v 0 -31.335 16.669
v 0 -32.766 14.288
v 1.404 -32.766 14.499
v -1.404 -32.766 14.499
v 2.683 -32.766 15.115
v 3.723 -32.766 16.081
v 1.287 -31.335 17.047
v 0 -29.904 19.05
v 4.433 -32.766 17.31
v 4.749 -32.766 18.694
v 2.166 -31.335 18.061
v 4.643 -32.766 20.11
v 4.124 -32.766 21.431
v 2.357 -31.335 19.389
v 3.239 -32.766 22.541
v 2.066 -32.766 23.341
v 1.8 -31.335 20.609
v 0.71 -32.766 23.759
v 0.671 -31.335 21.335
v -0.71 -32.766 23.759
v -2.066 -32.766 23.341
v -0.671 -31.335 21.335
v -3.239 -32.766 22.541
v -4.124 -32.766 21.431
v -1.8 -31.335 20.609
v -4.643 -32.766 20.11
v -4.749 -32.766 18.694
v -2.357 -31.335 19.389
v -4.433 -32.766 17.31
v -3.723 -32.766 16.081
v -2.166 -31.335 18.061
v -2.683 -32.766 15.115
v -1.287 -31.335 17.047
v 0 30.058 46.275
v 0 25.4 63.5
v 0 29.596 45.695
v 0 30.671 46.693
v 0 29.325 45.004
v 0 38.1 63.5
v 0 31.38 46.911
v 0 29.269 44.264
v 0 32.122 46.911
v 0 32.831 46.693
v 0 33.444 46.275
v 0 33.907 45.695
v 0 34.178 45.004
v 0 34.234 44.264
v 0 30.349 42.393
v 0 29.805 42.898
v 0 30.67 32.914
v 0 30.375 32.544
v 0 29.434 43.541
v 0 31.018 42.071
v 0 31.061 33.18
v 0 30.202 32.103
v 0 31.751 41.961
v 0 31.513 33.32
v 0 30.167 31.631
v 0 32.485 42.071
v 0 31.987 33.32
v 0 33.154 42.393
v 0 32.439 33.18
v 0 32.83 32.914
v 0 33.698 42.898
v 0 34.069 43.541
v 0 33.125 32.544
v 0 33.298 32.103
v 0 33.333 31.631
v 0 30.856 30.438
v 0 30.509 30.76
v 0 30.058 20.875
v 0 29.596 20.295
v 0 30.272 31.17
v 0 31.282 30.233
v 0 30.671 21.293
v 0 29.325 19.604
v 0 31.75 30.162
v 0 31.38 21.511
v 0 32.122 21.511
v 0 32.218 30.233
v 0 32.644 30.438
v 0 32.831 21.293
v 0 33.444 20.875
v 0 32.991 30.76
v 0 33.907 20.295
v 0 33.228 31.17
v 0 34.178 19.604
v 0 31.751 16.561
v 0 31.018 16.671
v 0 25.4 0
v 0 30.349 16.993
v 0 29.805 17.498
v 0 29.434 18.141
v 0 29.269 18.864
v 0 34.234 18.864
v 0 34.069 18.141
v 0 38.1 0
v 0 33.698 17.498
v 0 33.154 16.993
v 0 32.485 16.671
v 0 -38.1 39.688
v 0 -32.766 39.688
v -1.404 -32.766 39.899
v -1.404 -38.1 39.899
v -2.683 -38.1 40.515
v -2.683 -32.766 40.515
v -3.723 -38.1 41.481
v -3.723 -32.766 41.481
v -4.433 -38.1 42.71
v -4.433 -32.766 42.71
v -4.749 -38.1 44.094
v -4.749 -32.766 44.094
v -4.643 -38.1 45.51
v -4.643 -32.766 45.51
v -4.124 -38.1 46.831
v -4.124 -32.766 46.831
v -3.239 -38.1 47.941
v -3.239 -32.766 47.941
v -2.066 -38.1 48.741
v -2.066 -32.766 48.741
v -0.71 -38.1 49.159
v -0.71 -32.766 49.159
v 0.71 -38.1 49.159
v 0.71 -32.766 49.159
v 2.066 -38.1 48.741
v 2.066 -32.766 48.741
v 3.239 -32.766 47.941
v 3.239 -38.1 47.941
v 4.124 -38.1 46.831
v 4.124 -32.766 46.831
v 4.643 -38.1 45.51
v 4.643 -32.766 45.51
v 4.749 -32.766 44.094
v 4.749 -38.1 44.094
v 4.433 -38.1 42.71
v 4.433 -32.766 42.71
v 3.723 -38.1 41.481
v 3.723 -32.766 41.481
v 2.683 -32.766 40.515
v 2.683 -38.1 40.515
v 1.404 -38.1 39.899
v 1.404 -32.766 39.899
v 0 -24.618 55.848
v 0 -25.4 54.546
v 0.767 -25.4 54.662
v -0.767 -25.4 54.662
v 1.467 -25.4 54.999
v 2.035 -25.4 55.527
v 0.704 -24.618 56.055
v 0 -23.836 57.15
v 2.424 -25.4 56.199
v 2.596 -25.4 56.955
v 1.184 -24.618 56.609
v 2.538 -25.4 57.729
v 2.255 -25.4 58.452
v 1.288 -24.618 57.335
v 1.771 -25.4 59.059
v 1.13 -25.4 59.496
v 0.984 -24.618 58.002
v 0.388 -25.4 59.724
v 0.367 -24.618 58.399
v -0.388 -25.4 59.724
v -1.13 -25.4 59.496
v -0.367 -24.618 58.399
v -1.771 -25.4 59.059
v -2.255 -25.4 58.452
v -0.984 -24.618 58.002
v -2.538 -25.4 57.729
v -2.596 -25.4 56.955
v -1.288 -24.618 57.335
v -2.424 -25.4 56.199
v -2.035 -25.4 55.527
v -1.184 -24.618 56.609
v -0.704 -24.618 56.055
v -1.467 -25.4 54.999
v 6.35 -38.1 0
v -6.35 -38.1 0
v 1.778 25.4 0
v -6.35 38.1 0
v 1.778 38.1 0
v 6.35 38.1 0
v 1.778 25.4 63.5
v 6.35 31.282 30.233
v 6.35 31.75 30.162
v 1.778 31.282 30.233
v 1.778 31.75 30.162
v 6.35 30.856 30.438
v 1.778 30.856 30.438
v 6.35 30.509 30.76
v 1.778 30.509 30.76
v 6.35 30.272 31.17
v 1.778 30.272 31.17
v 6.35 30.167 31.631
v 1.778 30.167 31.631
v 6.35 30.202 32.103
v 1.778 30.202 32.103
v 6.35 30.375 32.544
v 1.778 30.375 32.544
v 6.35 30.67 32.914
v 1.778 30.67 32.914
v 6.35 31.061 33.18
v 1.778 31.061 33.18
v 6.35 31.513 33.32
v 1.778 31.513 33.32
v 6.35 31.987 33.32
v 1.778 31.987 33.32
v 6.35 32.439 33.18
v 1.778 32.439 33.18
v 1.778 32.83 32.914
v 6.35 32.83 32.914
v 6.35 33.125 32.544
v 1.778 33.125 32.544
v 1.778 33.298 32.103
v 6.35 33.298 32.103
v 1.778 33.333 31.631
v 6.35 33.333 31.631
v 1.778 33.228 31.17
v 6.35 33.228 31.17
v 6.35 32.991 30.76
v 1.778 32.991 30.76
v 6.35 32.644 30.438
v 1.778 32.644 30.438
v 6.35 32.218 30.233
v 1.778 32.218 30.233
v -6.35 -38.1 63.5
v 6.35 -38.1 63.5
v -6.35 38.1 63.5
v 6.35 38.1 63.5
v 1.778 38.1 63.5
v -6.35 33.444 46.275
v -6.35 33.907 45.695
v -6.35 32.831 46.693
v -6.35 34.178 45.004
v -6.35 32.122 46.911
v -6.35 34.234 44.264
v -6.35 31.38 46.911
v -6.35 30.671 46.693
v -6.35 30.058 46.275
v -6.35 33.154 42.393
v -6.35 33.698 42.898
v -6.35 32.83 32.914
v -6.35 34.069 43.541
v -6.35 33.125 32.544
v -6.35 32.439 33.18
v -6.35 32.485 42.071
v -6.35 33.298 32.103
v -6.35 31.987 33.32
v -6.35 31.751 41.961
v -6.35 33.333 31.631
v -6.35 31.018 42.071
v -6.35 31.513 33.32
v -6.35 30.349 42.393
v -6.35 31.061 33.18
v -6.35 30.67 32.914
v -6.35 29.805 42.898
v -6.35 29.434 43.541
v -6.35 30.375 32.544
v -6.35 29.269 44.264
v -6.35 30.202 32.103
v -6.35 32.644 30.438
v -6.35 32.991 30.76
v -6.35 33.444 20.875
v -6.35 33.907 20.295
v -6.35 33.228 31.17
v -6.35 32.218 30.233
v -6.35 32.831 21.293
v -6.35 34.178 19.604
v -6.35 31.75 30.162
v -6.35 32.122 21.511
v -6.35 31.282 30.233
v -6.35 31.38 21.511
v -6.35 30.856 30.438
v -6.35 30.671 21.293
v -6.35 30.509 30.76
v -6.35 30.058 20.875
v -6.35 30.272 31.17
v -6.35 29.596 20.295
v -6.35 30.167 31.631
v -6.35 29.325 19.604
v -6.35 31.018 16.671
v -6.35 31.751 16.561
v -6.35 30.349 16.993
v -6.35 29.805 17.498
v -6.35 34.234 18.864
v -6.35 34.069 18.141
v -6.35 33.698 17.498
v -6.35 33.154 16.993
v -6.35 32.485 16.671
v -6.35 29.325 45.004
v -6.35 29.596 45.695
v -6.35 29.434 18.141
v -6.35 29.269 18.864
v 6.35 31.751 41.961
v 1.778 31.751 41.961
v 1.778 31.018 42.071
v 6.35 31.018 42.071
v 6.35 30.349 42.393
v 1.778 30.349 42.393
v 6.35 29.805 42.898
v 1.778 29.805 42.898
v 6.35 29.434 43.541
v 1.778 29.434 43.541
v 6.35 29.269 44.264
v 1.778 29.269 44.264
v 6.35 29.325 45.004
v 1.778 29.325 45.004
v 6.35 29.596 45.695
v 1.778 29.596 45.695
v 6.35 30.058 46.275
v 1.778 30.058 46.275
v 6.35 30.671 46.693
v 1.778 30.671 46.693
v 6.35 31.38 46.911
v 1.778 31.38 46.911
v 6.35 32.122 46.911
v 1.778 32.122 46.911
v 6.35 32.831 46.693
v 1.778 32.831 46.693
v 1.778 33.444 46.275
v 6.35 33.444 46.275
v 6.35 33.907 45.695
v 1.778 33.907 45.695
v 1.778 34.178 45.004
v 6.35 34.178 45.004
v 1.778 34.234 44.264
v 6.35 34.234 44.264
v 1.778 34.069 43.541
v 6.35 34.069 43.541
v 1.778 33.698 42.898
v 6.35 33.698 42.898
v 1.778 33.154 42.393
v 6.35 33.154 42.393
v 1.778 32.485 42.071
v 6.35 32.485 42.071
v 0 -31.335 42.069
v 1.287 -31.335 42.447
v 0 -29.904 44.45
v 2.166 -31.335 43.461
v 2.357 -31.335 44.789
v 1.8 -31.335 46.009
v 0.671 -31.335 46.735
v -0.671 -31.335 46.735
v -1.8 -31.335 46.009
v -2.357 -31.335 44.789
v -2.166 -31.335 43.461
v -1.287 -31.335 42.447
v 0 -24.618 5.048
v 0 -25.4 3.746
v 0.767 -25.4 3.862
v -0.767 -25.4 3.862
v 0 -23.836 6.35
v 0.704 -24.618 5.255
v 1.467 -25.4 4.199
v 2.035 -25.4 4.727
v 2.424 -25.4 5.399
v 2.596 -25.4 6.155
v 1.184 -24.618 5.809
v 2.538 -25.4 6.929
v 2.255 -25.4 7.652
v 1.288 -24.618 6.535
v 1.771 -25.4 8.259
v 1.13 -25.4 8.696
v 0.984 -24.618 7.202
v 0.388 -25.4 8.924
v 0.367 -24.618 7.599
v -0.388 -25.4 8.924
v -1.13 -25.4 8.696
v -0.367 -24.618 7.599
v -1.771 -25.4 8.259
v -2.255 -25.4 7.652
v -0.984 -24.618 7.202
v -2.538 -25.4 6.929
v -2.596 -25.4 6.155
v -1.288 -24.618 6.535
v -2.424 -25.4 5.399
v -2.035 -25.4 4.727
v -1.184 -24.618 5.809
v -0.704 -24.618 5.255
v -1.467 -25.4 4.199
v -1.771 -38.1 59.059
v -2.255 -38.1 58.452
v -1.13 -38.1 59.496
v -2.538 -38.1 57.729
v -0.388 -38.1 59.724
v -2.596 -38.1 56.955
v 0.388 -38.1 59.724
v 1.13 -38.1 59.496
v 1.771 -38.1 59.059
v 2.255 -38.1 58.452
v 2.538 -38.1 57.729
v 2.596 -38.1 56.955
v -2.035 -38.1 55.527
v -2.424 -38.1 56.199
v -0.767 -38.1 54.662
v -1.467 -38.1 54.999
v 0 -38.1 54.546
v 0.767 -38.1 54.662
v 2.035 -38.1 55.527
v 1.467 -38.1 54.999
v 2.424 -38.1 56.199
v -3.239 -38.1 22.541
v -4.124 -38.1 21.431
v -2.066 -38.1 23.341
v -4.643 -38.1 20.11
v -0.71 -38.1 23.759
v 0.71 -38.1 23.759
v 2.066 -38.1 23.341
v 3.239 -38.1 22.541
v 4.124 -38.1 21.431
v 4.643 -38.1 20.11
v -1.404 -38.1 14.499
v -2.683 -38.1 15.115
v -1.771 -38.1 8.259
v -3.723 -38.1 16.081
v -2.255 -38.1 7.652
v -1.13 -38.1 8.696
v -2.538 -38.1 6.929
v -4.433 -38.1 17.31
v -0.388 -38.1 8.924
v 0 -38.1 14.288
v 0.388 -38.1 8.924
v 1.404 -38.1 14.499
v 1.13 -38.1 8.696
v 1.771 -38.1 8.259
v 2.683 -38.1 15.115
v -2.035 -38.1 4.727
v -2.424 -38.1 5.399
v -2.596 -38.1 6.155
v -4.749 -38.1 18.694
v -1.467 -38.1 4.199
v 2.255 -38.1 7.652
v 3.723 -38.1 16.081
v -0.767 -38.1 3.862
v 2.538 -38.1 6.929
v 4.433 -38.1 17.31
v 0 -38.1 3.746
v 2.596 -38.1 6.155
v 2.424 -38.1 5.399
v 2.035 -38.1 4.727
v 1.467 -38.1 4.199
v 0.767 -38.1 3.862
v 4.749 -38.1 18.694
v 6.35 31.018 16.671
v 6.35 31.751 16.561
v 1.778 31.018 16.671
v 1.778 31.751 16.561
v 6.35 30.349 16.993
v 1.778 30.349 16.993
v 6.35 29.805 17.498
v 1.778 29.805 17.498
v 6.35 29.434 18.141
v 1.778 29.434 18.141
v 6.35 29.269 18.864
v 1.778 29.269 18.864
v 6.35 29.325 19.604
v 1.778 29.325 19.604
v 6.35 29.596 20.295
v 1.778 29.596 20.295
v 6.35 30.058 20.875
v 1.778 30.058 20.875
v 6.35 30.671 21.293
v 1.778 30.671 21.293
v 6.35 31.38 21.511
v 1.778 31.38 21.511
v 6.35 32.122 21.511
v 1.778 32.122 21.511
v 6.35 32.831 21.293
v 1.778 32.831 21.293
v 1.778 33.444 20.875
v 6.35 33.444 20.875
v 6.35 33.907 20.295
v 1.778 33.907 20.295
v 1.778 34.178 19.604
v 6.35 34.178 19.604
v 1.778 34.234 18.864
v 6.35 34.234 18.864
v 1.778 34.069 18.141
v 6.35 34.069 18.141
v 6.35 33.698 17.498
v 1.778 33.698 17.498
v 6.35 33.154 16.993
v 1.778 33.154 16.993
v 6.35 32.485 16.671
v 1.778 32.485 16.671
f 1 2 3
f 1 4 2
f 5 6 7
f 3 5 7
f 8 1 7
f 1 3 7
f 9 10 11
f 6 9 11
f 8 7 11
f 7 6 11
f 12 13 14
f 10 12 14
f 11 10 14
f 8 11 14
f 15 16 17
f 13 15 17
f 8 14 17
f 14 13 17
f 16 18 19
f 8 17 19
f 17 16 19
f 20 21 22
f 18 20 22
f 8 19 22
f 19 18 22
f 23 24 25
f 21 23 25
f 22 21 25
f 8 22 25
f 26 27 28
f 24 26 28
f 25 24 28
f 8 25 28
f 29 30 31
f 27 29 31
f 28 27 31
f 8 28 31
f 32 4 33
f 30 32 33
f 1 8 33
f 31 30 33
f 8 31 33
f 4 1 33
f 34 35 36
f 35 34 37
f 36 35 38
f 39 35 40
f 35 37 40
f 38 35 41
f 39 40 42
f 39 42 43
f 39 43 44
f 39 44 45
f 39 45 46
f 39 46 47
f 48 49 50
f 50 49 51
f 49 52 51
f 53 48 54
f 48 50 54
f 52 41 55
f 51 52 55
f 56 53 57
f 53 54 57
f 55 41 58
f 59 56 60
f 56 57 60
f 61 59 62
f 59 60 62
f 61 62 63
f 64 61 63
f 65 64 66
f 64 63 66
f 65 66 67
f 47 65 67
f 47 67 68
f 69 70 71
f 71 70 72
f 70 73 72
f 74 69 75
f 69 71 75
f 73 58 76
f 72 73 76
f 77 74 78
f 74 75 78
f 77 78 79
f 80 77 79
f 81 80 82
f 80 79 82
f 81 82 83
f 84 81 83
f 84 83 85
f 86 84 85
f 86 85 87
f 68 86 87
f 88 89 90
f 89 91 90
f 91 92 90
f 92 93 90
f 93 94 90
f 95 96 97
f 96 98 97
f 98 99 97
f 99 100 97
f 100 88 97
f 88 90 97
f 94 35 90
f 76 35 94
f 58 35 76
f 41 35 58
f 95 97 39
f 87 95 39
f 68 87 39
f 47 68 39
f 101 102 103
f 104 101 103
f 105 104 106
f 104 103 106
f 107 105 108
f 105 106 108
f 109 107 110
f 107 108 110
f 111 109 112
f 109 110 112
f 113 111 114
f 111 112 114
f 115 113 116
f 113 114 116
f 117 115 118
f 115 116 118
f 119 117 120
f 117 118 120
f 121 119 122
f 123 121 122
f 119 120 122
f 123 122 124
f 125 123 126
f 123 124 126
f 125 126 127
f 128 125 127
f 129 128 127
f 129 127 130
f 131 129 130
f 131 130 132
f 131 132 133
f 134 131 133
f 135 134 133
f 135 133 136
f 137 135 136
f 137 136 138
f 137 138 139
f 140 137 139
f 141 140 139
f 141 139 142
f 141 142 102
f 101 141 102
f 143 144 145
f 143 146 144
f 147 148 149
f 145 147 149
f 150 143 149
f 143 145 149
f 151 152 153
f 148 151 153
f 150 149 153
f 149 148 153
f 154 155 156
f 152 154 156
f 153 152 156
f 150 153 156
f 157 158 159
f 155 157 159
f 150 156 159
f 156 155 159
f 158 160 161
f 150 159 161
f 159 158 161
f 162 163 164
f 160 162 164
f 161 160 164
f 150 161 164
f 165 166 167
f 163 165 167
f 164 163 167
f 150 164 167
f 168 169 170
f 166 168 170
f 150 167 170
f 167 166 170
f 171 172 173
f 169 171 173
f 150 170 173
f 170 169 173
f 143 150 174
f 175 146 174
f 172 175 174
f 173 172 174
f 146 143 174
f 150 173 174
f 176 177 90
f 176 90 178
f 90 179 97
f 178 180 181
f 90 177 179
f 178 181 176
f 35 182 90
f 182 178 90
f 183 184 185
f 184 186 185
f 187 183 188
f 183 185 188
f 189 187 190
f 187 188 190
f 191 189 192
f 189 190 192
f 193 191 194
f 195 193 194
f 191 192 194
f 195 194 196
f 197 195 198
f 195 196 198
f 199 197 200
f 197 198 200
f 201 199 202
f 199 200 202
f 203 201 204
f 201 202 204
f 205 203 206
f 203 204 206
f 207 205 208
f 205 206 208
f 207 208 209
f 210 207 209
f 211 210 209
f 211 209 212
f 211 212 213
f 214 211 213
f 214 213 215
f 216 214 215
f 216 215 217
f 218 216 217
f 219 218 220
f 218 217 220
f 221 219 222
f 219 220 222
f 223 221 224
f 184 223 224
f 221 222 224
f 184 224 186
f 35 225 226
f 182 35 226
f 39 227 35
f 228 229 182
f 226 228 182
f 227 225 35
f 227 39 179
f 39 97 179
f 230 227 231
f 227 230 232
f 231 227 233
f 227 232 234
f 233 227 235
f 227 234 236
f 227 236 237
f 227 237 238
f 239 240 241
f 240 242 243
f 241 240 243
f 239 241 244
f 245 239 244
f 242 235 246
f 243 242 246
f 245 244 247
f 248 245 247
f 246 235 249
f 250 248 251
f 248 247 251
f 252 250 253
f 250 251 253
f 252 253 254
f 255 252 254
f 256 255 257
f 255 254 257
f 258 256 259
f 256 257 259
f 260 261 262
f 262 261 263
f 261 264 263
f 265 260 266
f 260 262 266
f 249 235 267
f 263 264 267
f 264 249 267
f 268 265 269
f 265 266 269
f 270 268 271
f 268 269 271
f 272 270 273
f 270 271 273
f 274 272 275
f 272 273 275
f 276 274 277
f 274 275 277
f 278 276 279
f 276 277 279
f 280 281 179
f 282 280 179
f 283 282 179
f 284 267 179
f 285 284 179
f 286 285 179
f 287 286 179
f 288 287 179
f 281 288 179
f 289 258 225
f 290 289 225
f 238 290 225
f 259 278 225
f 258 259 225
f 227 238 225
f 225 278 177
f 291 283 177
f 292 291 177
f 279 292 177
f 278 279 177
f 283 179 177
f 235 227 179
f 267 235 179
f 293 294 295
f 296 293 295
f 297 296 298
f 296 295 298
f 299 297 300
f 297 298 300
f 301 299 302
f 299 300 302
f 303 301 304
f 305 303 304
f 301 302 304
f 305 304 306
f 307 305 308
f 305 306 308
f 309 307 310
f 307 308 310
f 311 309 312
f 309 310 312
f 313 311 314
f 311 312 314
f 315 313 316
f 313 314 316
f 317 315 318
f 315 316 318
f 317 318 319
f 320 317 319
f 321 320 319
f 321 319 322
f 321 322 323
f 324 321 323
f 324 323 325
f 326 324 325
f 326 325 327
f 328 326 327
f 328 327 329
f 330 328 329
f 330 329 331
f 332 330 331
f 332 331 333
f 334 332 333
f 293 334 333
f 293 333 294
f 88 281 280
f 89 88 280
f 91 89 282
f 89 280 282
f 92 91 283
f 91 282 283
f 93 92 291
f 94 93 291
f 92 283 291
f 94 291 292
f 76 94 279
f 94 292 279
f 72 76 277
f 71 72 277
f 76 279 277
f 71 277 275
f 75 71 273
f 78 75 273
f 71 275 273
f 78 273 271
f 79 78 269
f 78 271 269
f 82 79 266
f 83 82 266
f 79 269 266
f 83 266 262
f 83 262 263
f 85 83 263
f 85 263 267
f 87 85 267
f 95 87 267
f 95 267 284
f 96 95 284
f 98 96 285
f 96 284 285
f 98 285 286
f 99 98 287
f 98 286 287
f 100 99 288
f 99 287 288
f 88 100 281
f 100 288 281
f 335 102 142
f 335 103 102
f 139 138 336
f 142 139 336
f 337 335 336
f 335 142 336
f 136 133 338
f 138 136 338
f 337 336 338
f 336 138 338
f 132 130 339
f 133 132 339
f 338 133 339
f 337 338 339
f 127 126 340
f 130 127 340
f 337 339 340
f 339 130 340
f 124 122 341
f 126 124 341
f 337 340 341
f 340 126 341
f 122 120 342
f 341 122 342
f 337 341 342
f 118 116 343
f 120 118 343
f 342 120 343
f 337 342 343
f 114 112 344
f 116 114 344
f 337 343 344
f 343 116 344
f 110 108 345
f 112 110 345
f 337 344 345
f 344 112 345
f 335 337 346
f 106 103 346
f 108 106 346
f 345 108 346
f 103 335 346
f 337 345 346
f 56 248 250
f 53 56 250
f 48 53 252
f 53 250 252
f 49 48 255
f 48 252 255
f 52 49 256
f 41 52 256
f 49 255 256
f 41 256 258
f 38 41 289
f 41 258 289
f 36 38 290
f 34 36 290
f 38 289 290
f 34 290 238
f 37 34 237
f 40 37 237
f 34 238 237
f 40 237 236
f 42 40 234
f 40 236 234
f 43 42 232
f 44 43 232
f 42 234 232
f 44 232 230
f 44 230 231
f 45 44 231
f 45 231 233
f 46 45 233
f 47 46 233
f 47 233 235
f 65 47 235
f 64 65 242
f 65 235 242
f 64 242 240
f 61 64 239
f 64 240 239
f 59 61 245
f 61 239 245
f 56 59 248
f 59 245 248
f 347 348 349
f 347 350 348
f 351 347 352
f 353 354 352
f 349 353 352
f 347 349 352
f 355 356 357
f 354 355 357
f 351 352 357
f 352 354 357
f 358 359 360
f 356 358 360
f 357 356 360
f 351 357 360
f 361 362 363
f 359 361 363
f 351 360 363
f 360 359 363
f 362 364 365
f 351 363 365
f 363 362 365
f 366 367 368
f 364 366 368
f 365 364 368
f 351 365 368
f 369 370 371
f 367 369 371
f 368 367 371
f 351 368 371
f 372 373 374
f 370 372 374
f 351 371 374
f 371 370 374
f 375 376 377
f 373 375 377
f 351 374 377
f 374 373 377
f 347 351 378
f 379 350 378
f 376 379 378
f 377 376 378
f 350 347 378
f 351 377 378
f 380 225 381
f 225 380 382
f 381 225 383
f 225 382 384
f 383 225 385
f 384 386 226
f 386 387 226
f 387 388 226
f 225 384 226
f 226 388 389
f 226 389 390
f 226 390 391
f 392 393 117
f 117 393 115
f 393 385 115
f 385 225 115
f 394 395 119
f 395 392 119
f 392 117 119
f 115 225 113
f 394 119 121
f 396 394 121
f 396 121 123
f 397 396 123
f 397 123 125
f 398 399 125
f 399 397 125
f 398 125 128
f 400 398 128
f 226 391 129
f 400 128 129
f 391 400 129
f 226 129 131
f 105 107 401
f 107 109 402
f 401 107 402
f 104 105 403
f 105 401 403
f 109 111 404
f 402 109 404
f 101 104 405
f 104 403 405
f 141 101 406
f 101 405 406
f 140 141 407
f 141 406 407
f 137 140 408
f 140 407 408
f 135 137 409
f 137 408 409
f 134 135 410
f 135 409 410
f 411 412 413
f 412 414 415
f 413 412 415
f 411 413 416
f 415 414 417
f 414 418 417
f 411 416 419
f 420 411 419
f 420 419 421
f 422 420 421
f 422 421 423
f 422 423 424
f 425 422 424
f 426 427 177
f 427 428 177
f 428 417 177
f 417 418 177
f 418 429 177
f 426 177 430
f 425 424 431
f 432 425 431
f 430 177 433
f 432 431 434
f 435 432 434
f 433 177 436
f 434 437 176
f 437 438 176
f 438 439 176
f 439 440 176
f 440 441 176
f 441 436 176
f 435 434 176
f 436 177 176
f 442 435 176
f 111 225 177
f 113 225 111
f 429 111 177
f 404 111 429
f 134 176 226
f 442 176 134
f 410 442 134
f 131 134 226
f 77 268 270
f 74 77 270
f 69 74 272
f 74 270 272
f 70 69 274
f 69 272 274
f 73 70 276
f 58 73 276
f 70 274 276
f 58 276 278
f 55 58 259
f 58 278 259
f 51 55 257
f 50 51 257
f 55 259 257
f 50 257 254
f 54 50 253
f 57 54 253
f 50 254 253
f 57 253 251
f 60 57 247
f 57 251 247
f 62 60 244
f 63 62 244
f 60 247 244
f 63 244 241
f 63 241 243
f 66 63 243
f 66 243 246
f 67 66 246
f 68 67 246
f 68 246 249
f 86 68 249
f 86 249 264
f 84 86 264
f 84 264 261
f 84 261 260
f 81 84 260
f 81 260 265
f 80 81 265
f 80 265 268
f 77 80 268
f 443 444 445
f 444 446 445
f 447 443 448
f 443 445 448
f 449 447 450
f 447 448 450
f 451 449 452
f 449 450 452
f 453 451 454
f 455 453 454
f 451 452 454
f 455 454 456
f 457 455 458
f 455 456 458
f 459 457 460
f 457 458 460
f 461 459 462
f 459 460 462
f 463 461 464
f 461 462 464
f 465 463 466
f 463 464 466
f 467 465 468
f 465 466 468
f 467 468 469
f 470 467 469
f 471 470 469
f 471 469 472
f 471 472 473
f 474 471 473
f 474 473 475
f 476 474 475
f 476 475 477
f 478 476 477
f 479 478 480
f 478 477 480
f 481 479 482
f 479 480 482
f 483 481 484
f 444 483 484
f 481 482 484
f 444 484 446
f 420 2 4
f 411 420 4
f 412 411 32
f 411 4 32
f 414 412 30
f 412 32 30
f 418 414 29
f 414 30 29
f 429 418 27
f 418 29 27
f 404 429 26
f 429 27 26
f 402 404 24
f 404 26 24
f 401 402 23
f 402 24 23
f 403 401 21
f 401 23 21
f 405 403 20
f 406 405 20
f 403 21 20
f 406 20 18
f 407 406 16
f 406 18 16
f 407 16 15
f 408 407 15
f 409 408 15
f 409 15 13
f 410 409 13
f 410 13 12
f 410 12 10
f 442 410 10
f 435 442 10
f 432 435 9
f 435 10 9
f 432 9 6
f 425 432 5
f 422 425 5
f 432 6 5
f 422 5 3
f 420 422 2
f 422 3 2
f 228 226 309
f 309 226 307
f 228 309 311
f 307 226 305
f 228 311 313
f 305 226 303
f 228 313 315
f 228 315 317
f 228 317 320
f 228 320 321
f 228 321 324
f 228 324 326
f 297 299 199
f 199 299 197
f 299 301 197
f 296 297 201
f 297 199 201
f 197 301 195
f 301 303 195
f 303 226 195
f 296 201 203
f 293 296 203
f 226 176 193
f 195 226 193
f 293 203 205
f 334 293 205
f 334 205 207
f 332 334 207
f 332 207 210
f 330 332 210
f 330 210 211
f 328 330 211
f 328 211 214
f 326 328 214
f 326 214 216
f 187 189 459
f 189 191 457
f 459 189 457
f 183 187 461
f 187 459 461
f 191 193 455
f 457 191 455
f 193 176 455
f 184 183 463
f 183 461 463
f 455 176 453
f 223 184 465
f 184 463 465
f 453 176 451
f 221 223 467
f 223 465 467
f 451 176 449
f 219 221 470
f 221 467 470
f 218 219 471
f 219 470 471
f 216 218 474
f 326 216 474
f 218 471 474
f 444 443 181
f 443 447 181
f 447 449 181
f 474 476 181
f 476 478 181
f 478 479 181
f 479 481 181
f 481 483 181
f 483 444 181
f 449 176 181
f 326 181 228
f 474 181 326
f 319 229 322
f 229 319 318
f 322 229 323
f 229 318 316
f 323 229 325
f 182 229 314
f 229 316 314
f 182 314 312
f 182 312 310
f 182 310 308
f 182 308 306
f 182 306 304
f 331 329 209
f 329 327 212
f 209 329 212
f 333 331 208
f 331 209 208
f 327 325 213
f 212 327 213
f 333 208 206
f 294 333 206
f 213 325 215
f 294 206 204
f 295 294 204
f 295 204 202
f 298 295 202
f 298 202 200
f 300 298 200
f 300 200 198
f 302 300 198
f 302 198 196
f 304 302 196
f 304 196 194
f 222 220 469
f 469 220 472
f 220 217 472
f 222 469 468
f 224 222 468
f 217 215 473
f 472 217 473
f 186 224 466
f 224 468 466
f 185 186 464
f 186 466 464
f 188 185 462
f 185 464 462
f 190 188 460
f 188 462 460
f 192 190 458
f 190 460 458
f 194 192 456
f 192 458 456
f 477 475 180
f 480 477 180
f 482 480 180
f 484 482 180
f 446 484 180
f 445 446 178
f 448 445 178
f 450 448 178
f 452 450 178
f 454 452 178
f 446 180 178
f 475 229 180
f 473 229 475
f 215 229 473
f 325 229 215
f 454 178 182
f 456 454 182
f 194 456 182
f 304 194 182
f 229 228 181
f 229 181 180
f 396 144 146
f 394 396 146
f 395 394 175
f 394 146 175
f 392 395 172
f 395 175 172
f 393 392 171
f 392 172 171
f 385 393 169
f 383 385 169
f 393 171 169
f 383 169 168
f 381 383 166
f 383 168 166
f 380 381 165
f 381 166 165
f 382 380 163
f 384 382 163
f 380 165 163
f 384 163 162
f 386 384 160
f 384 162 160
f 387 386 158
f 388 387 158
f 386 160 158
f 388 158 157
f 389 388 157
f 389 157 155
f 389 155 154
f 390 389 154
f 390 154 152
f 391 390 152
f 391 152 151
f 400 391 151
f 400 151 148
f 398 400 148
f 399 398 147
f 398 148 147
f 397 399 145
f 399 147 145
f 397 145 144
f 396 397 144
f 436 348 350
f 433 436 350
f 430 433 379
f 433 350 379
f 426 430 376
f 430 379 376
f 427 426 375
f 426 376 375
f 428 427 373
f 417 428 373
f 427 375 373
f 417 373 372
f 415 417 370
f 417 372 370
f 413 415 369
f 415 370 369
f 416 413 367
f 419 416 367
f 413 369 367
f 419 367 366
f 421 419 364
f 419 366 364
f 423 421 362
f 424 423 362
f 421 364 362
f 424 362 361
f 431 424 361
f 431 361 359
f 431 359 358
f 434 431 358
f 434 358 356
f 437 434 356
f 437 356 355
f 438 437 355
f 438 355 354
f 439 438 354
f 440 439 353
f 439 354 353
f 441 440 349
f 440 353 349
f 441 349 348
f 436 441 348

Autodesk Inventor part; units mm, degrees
ref_plane "YZ Plane" through (0, 0, 0) normal (1, 0, 0) x (0, 1, 0)
ref_plane "XZ Plane" through (0, 0, 0) normal (0, 1, 0) x (-1, 0, 0)
ref_plane "XY Plane" through (0, 0, 0) normal (0, 0, 1) x (1, 0, 0)
sketch "Sketch1" plane through (0, 0, 0) normal (0, 0, 1) x (1, 0, 0)
  line L0 (-6.35, -38.1) -> (6.35, -38.1)
  line L1 (6.35, -38.1) -> (6.35, 38.1)
  line L2 (6.35, 38.1) -> (-6.35, 38.1)
  line L3 (-6.35, 38.1) -> (-6.35, -38.1)
  line L4 (-6.35, -38.1) -> (6.35, 38.1) construction
  line L5 (6.35, -38.1) -> (-6.35, 38.1) construction
  line L6 (-0.889, 50.8) -> (0.889, 50.8)
  line L7 (0.889, 50.8) -> (0.889, 25.4)
  line L8 (0.889, 25.4) -> (-0.889, 25.4)
  line L9 (-0.889, 25.4) -> (-0.889, 50.8)
  line L10 (-0.889, 50.8) -> (0.889, 25.4) construction
  line L11 (0.889, 50.8) -> (-0.889, 25.4) construction
  point P0 (0, 0)
  point P1 (0, 38.1)
  dimension "d0" = 12.7
  dimension "d1" = 76.2
  dimension "d2" = 1.778
  dimension "d3" = 12.7
extrude "Extrusion1" add sketch "Sketch1" along normal blind 63.5 contours L3 L2 L9 L8 L7 L1 L0 | L2 L7 L8 L9
sketch "Sketch2" plane through (0, 0, 0) normal (0, 0, -1) x (-1, 0, 0)
  line L0 (-6.35, 38.1) -> (6.35, 38.1) projected
  line L1 (0, 38.1) -> (-1.778, 38.1)
  line L2 (-1.778, 38.1) -> (-1.778, 25.4)
  line L3 (-1.778, 25.4) -> (0, 25.4)
  line L4 (0, 25.4) -> (0, 38.1)
  point P0 (0, 0)
  dimension "d6" = 1.778
  dimension "d7" = 12.7
extrude "Extrusion2" cut sketch "Sketch2" against normal blind 63.5
sketch "Sketch3" plane through (6.35, -38.1, 0) normal (1, 0, 0) x (0, 0, -1)
  line L0 (0, 76.2) -> (-63.5, 76.2) projected
  line L1 (-63.5, 0) -> (-63.5, 76.2) projected
  point P0 (0, 38.1)
  point P1 (-31.75, 69.85)
  dimension "d10" = 6.35
  dimension "d11" = 31.75
hole "Hole1" at (6.35, 31.75, 31.75) direction (-1, 0, 0) diameter 3.175 end through all
sketch "Sketch4" plane through (6.35, -38.1, 0) normal (1, 0, 0) x (0, 0, -1)
  line L0 (-44.45, 69.8514) -> (-19.05, 69.8514)
  line L1 (0, 0) -> (0, 76.2) projected
  point P0 (0, 38.1)
  dimension "d19" = 25.4
  dimension "d20" = 19.05
hole "Hole2" at (6.35, 31.7514, 44.45) at (6.35, 31.7514, 19.05) direction (-1, 0, 0) diameter 4.9784 depth 19.05 tip angle 118 thread size "1/4-20 UNC" class "2B" standard "ANSI Unified Screw Threads"
sketch "Sketch5" plane through (-6.35, -38.1, 0) normal (0, -1, 0) x (1, 0, 0)
  line L0 (6.35, 63.5) -> (6.35, 0) projected
  line L1 (6.35, 57.15) -> (6.35, 6.35)
  dimension "d28" = 50.8
  dimension "d29" = 6.35
hole "Hole3" at (0, -38.1, 57.15) at (0, -38.1, 6.35) direction (0, 1, 0) diameter 5.207 depth 12.7 tip angle 118
sketch "Sketch6" plane through (-6.35, -38.1, 0) normal (0, -1, 0) x (1, 0, 0)
  point P0 (6.35, 0)
sketch "Sketch7" plane through (-6.35, -38.1, 0) normal (0, -1, 0) x (1, 0, 0)
  line L0 (6.35, 63.5) -> (6.35, 0) projected
  line L1 (6.35, 44.45) -> (6.35, 19.05)
  line L2 (0, 63.5) -> (12.7, 63.5) projected
  dimension "d37" = 25.4
  dimension "d38" = 19.05
hole "Hole4" at (0, -38.1, 44.45) at (0, -38.1, 19.05) direction (0, 1, 0) diameter 9.525 depth 5.334 tip angle 118
properties part number "mask holder"
